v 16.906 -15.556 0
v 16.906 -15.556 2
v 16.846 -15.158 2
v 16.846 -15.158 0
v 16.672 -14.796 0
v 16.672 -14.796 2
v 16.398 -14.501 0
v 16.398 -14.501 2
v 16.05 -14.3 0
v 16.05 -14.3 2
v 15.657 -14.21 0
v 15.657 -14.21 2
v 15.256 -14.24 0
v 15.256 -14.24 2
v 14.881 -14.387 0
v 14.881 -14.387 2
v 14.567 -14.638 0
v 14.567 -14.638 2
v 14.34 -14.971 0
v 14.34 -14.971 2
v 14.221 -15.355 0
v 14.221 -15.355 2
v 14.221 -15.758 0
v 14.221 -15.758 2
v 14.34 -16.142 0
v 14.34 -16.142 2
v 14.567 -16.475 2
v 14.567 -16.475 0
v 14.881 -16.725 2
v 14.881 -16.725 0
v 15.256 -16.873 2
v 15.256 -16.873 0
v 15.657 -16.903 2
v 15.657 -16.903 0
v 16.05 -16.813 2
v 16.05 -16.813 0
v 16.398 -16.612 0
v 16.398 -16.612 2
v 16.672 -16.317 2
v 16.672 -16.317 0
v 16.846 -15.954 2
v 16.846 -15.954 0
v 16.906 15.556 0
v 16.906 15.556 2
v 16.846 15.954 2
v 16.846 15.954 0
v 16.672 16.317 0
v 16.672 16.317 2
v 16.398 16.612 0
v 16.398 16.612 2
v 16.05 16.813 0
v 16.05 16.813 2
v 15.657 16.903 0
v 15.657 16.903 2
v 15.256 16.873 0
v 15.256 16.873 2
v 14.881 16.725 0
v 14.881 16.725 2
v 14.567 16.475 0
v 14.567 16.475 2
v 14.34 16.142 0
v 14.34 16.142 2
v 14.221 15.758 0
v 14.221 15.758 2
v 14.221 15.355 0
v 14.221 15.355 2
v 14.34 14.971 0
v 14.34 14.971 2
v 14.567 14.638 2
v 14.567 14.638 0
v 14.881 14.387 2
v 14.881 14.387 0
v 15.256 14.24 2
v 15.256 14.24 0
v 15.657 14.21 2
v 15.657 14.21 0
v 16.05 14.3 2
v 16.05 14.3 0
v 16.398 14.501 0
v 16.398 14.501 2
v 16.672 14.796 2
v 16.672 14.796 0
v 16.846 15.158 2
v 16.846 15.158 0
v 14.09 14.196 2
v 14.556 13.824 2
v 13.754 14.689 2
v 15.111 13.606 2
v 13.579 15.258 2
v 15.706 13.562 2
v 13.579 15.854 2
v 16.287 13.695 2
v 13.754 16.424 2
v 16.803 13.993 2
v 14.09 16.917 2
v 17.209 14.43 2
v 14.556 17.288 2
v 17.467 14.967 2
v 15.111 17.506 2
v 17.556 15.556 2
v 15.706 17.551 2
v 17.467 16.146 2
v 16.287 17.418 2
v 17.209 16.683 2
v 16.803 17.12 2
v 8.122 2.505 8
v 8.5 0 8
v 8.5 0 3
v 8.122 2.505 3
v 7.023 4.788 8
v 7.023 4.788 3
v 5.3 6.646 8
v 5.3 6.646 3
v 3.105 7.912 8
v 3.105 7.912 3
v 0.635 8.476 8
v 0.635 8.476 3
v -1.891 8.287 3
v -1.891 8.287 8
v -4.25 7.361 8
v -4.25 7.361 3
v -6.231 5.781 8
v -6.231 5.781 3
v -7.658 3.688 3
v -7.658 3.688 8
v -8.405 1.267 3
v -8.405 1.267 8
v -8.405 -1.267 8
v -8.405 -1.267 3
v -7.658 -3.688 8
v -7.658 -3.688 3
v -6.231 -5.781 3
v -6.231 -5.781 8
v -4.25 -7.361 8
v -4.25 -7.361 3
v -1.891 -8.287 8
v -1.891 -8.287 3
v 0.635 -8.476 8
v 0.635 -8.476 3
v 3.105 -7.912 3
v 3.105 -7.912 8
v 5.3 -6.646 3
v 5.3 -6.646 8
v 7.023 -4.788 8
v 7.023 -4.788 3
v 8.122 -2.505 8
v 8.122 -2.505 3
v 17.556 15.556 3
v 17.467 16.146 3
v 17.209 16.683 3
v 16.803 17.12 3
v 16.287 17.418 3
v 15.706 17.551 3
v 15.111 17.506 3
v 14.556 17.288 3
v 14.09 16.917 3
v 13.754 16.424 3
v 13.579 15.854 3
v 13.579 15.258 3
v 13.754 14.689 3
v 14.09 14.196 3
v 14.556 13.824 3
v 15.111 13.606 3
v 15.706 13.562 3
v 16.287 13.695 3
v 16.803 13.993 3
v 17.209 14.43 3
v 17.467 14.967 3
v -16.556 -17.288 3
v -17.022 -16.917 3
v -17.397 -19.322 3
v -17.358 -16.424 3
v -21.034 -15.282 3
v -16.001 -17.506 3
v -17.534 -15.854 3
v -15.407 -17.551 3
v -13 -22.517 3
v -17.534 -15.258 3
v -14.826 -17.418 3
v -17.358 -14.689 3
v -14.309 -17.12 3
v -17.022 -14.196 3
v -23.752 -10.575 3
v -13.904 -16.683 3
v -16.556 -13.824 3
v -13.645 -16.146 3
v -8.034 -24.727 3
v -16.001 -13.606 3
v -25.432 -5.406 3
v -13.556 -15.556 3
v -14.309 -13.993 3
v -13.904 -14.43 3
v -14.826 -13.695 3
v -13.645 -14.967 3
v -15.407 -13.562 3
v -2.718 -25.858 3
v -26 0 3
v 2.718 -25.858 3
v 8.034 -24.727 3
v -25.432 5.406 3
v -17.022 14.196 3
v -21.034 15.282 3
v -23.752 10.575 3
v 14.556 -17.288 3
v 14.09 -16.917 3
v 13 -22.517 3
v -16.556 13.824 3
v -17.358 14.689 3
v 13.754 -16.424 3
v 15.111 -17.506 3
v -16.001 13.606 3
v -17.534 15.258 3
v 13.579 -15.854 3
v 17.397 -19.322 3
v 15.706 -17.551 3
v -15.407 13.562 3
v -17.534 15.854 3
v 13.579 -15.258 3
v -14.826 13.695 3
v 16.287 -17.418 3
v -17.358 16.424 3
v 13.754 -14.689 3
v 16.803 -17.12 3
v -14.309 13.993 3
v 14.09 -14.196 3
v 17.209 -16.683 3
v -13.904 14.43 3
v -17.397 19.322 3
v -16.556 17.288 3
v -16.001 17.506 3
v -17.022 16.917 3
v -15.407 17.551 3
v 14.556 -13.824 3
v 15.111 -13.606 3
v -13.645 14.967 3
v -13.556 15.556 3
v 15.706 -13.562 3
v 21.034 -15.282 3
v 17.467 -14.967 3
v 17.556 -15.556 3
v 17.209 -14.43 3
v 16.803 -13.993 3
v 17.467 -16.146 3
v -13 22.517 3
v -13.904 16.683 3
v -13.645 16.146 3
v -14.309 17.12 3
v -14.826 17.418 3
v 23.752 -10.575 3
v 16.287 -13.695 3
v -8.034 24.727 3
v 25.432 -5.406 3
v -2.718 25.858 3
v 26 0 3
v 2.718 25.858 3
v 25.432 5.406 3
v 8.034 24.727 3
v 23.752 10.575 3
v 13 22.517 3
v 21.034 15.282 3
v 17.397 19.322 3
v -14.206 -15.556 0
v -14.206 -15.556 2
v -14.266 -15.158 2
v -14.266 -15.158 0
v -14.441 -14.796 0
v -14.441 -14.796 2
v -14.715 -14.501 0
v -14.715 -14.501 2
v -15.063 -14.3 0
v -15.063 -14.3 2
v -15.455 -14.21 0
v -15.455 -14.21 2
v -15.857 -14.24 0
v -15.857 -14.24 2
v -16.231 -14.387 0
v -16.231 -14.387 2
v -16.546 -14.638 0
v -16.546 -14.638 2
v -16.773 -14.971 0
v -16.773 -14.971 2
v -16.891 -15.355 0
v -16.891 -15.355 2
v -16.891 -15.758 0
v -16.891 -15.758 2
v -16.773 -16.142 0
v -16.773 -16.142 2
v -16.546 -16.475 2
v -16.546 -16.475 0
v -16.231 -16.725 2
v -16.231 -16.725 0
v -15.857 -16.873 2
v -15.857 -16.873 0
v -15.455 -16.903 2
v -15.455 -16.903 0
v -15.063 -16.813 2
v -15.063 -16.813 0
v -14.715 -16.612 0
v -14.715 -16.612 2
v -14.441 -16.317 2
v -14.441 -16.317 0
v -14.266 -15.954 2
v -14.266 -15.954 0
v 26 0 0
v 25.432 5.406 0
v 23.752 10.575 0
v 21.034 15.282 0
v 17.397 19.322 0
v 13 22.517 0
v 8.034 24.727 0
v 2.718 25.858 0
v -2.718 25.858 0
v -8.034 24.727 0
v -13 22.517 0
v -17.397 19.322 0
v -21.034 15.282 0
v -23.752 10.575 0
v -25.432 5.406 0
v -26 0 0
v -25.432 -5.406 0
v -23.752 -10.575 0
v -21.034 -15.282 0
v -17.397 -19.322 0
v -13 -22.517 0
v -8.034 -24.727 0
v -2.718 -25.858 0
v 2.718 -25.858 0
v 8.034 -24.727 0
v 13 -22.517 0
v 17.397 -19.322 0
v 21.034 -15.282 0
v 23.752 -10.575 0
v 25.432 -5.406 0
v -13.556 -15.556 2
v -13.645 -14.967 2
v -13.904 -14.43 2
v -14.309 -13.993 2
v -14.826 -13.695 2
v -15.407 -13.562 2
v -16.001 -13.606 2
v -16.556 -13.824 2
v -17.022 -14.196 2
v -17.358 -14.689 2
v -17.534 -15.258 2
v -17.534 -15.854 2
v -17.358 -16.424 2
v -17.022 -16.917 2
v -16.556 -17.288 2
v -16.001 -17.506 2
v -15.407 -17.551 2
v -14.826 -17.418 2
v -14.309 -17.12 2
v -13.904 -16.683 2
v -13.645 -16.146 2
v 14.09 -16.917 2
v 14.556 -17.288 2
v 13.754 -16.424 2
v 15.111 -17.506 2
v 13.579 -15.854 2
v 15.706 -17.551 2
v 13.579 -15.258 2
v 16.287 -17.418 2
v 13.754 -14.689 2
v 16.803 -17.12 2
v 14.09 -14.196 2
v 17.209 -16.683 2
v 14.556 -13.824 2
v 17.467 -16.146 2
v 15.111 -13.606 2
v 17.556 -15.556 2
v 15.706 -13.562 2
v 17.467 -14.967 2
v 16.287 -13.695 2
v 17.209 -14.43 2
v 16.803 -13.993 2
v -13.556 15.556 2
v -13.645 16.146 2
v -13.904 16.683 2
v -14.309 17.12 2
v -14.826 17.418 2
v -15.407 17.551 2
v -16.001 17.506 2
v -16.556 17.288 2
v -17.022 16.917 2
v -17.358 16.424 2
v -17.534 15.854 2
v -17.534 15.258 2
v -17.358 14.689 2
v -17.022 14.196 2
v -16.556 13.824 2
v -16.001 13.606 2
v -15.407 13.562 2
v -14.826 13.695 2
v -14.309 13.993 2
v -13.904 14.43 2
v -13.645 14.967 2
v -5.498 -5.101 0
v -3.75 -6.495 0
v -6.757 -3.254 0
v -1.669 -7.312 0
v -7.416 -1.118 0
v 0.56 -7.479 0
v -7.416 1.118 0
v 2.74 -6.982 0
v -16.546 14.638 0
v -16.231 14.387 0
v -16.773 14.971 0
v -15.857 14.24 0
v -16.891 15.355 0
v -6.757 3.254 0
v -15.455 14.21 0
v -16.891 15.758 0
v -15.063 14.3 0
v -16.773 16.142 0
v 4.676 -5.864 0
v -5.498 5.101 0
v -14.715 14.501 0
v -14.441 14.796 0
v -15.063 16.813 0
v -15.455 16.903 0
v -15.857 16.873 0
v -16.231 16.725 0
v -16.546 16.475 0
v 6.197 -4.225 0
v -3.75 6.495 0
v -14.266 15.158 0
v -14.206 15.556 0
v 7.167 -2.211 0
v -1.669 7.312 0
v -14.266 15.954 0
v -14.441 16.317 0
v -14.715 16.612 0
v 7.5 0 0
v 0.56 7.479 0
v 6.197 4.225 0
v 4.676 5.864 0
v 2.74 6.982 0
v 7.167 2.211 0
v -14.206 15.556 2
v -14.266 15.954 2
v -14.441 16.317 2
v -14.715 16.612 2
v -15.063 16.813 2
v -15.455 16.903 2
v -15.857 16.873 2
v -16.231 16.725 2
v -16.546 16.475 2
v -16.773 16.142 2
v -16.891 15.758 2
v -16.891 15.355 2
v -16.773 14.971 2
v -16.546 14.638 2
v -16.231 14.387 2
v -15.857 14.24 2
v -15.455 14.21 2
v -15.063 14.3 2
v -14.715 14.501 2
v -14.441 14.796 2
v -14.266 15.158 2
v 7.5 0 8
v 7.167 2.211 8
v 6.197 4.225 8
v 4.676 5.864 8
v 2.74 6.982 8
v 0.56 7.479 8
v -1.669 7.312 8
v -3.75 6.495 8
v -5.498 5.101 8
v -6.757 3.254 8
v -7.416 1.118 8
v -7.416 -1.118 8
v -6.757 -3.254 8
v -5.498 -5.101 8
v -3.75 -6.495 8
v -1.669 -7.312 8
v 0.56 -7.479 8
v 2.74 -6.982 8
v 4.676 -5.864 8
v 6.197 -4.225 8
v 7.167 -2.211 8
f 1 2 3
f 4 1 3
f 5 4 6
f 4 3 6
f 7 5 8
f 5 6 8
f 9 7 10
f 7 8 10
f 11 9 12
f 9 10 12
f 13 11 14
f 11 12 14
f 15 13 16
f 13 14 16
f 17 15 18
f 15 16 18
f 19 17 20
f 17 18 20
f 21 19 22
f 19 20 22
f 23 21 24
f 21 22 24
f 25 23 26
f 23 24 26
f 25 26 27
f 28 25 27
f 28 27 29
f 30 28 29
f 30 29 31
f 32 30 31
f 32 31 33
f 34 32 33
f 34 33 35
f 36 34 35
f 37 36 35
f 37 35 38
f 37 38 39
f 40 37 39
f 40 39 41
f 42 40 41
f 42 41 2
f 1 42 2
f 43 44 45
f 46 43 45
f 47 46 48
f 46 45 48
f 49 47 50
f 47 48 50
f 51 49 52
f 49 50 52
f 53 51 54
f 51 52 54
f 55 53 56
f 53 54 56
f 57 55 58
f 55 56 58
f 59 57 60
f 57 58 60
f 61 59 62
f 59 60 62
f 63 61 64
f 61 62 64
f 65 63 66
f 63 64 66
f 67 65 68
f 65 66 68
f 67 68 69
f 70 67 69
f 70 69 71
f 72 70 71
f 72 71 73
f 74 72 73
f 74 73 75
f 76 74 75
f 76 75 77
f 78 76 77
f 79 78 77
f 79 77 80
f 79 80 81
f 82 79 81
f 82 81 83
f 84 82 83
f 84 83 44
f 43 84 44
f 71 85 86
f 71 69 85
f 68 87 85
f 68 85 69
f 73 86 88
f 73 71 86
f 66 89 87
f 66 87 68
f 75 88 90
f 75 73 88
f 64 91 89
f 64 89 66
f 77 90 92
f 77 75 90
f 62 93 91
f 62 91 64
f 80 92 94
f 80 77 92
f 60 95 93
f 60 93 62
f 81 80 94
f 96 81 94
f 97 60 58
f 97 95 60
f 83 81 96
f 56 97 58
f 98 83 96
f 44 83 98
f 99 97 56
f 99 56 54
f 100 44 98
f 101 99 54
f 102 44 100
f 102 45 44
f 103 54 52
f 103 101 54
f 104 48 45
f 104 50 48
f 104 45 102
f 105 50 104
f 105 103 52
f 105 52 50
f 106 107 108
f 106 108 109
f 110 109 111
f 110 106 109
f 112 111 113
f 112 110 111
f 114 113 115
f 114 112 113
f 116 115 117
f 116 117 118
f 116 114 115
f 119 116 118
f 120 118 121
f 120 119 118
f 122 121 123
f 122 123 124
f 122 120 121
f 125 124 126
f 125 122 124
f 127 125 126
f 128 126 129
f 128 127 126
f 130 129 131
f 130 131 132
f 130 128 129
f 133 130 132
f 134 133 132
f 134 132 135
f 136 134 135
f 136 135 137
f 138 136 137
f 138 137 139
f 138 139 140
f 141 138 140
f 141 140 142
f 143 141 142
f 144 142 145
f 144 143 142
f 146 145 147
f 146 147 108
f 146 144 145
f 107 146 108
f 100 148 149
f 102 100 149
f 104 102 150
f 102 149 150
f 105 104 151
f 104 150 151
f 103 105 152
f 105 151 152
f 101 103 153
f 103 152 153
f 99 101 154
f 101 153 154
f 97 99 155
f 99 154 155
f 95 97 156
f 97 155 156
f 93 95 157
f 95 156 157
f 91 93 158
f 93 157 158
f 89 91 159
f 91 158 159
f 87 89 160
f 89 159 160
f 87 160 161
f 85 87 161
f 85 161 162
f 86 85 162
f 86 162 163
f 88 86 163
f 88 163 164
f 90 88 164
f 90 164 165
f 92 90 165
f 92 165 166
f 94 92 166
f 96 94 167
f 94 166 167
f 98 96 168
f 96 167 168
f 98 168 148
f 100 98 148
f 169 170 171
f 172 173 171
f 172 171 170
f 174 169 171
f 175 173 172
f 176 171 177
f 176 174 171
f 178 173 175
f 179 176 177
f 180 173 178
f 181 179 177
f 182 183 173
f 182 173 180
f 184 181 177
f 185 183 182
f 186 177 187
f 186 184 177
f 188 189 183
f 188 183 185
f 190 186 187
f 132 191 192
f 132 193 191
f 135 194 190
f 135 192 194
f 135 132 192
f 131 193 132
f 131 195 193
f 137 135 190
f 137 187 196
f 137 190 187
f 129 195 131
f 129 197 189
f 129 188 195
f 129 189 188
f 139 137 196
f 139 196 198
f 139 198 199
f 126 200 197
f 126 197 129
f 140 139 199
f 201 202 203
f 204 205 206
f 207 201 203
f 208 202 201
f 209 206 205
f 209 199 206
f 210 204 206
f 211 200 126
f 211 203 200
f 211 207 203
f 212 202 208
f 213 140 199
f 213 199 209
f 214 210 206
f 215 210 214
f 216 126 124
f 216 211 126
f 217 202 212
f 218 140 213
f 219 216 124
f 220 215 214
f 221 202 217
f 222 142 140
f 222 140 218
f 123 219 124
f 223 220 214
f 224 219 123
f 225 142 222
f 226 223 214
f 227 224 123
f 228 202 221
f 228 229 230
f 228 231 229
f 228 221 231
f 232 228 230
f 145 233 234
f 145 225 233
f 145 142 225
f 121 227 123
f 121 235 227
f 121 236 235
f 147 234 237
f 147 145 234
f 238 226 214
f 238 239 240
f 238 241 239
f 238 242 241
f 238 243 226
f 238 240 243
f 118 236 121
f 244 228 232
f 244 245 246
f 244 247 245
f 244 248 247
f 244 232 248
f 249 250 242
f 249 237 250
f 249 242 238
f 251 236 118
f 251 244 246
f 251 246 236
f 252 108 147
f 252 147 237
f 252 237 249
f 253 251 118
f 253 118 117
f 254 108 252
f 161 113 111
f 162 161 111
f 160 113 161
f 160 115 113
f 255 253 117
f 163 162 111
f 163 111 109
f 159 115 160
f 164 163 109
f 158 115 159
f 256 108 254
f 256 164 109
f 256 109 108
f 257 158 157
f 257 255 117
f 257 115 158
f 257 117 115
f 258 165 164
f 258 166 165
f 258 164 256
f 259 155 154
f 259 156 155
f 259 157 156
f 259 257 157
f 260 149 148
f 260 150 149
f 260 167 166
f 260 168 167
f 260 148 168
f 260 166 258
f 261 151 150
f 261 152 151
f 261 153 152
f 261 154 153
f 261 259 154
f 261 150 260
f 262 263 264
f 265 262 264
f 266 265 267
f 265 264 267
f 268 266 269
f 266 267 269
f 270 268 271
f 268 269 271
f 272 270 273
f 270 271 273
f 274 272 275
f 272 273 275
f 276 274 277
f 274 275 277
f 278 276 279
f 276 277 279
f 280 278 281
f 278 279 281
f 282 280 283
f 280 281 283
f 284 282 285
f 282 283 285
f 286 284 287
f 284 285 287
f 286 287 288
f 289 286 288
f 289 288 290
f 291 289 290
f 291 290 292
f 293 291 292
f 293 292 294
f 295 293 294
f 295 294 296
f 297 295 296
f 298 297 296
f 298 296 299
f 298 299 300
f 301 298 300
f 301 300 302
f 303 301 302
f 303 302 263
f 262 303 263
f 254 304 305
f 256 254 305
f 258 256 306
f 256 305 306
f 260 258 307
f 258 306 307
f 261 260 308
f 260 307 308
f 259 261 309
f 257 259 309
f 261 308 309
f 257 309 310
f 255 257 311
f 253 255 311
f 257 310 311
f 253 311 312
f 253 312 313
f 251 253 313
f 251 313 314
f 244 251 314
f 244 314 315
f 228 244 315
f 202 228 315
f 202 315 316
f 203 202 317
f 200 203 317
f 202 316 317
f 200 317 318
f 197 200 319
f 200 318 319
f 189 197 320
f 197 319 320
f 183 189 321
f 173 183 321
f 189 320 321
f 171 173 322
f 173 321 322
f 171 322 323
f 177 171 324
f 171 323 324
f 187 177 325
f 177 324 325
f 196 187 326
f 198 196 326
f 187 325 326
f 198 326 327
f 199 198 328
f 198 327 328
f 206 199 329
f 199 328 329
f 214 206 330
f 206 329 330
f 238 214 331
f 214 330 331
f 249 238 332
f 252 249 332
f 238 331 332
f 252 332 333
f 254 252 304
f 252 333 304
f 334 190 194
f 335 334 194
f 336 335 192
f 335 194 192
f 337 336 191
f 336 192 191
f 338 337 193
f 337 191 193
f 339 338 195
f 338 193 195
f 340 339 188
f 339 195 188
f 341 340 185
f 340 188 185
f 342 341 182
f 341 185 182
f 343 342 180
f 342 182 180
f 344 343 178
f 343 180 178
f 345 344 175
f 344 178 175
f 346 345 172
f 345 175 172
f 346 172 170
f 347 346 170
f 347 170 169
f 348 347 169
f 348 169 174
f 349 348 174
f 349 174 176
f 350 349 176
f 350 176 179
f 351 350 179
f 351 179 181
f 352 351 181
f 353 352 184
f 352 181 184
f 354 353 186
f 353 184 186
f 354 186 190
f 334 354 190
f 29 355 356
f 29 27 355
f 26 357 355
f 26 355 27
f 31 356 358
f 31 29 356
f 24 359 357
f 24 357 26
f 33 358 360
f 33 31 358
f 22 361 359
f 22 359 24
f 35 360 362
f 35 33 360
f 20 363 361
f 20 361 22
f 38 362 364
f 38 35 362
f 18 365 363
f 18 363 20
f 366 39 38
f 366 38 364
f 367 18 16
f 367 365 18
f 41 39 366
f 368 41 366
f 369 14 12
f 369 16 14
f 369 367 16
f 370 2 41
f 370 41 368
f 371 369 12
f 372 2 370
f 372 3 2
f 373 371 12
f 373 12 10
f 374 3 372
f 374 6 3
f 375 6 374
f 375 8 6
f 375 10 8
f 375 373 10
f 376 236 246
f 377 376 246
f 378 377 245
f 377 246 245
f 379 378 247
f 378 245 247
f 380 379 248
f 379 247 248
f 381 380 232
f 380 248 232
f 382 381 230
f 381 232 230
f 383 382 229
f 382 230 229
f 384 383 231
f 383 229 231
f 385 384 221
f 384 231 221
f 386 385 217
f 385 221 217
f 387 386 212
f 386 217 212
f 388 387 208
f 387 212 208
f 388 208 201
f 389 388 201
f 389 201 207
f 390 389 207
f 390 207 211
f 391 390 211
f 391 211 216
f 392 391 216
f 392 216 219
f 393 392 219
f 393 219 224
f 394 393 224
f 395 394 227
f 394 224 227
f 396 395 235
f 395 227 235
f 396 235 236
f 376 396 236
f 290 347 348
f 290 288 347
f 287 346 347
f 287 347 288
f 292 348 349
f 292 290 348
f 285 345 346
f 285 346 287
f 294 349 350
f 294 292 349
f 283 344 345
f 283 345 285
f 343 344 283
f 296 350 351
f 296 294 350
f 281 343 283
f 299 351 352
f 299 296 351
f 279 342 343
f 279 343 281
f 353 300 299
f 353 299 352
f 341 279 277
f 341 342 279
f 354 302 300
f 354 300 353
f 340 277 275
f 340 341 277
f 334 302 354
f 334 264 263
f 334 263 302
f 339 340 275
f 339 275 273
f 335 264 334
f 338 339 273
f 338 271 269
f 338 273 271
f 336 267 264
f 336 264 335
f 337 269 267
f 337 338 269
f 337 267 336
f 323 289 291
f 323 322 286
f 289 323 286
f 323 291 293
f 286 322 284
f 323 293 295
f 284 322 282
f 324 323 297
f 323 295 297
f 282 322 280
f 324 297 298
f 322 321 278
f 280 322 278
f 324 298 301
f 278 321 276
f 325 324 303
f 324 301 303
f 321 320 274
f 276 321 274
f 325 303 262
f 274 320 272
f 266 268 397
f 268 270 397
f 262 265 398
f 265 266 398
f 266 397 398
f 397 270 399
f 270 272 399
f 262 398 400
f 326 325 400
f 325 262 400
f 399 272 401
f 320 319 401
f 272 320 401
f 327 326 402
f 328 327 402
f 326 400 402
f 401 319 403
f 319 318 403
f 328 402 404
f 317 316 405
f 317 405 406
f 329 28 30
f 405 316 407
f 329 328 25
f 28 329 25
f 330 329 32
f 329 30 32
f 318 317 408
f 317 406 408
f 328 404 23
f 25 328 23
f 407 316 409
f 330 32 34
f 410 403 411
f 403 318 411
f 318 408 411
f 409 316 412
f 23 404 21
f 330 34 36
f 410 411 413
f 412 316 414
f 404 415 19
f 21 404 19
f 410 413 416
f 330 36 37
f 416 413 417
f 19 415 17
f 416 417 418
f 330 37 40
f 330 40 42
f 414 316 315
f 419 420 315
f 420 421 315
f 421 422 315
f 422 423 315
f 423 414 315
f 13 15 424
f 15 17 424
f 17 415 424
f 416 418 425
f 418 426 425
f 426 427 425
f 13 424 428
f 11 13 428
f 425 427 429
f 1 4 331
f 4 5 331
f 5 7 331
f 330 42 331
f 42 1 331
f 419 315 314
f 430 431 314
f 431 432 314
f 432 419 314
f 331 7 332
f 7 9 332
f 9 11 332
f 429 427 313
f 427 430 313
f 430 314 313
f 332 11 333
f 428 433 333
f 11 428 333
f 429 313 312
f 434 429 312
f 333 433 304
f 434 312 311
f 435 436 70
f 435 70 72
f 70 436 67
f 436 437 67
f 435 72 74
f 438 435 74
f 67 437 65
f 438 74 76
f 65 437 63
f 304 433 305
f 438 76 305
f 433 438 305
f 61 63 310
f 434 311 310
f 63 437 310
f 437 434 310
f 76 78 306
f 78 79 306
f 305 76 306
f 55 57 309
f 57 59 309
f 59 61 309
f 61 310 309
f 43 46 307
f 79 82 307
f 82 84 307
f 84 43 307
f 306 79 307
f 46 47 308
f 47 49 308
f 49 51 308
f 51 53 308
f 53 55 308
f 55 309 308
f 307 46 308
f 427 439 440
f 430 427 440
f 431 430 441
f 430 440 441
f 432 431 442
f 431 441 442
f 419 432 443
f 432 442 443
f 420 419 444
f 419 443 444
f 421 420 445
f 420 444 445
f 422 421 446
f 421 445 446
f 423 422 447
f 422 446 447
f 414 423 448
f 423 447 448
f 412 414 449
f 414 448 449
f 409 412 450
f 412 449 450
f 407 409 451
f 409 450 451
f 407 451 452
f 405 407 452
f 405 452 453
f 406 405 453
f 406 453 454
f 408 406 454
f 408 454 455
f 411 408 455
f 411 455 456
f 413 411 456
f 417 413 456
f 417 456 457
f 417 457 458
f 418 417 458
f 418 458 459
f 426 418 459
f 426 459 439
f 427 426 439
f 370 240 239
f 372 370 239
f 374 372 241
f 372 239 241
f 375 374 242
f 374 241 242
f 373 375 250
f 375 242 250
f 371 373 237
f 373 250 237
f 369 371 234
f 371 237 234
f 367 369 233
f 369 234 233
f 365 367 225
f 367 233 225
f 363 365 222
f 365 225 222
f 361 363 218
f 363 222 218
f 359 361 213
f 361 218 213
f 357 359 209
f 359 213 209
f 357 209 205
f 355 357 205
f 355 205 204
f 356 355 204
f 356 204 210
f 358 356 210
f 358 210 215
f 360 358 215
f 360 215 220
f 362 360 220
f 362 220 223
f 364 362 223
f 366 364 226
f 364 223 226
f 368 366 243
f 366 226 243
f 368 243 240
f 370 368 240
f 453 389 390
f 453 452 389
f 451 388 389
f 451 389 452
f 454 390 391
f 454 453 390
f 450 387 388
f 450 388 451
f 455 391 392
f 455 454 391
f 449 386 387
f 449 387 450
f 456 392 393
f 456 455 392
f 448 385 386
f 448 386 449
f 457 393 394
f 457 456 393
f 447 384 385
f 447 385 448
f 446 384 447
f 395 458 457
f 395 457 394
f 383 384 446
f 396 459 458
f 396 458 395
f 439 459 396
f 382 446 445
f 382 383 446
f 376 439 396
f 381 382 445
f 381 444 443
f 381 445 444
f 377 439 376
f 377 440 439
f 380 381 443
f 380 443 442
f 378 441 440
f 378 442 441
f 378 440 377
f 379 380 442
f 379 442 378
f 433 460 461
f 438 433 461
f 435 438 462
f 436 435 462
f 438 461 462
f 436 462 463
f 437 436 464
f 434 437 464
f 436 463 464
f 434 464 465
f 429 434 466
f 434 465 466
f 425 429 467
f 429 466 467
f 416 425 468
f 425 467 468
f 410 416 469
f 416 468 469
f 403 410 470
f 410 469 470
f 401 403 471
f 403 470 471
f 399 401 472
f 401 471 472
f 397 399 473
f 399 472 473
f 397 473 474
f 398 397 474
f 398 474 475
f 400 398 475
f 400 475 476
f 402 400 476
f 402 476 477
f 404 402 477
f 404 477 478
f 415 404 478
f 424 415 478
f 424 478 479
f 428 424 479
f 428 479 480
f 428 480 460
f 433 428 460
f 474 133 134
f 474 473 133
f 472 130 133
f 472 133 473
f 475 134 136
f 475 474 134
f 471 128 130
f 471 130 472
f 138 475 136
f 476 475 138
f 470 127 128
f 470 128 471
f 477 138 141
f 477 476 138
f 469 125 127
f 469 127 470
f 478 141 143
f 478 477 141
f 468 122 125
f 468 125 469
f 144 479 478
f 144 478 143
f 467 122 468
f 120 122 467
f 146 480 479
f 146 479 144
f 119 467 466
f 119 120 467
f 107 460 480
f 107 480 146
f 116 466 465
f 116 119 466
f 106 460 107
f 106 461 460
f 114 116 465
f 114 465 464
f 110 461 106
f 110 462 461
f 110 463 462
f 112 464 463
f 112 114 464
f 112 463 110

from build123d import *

# Parameters (mm, degrees)
SKETCH_1_R          = 26
EXTRUDE_1_DEPTH     = 3
SKETCH_2_R          = 7.5
CUT_EXTRUDE_1_DEPTH = 37.891733491
EXTRUDE_START       = 5
SKETCH_3_R          = 8.5
SKETCH_3_R_2        = 7.5
EXTRUDE_3_DEPTH     = 5
SKETCH_4_R          = 1.35
CUT_EXTRUDE_2_DEPTH = 38.107950631
SKETCH_5_R          = 2
CUT_EXTRUDE_3_DEPTH = 1


with BuildPart() as part:
    # Эскиз1 → Бобышка-Вытянуть1 (new body)
    with BuildSketch(Plane.XY):
        Circle(SKETCH_1_R)
    extrude(amount=EXTRUDE_1_DEPTH)

    # Эскиз2 → Вырез-Вытянуть1 (cut, through all)
    with BuildSketch(Plane.XY.offset(3)):
        Circle(SKETCH_2_R)
    extrude(amount=-CUT_EXTRUDE_1_DEPTH, mode=Mode.SUBTRACT)

    # Эскиз3 → Бобышка-Вытянуть3 (add)
    with BuildSketch(Plane.XY.offset(3).offset(EXTRUDE_START)):
        Circle(SKETCH_3_R)
        Circle(SKETCH_3_R_2, mode=Mode.SUBTRACT)
    extrude(amount=-EXTRUDE_3_DEPTH)

    # Эскиз4 → Вырез-Вытянуть2 (cut, through all)
    with BuildSketch(Plane.XY.offset(3)):
        with Locations((-15.556349186, 15.556349186)):
            Circle(SKETCH_4_R)
        with Locations((15.556349186, 15.556349186)):
            Circle(SKETCH_4_R)
        with Locations((15.556349186, -15.556349186)):
            Circle(SKETCH_4_R)
        with Locations((-15.556349186, -15.556349186)):
            Circle(SKETCH_4_R)
    extrude(amount=-CUT_EXTRUDE_2_DEPTH, mode=Mode.SUBTRACT)

    # Эскиз5 → Вырез-Вытянуть3 (cut)
    with BuildSketch(Plane.XY.offset(3)):
        with Locations((-15.556349186, 15.556349186)):
            Circle(SKETCH_5_R)
        with Locations((15.556349186, 15.556349186)):
            Circle(SKETCH_5_R)
        with Locations((15.556349186, -15.556349186)):
            Circle(SKETCH_5_R)
        with Locations((-15.556349186, -15.556349186)):
            Circle(SKETCH_5_R)
    extrude(amount=-CUT_EXTRUDE_3_DEPTH, mode=Mode.SUBTRACT)


solid = part.part
